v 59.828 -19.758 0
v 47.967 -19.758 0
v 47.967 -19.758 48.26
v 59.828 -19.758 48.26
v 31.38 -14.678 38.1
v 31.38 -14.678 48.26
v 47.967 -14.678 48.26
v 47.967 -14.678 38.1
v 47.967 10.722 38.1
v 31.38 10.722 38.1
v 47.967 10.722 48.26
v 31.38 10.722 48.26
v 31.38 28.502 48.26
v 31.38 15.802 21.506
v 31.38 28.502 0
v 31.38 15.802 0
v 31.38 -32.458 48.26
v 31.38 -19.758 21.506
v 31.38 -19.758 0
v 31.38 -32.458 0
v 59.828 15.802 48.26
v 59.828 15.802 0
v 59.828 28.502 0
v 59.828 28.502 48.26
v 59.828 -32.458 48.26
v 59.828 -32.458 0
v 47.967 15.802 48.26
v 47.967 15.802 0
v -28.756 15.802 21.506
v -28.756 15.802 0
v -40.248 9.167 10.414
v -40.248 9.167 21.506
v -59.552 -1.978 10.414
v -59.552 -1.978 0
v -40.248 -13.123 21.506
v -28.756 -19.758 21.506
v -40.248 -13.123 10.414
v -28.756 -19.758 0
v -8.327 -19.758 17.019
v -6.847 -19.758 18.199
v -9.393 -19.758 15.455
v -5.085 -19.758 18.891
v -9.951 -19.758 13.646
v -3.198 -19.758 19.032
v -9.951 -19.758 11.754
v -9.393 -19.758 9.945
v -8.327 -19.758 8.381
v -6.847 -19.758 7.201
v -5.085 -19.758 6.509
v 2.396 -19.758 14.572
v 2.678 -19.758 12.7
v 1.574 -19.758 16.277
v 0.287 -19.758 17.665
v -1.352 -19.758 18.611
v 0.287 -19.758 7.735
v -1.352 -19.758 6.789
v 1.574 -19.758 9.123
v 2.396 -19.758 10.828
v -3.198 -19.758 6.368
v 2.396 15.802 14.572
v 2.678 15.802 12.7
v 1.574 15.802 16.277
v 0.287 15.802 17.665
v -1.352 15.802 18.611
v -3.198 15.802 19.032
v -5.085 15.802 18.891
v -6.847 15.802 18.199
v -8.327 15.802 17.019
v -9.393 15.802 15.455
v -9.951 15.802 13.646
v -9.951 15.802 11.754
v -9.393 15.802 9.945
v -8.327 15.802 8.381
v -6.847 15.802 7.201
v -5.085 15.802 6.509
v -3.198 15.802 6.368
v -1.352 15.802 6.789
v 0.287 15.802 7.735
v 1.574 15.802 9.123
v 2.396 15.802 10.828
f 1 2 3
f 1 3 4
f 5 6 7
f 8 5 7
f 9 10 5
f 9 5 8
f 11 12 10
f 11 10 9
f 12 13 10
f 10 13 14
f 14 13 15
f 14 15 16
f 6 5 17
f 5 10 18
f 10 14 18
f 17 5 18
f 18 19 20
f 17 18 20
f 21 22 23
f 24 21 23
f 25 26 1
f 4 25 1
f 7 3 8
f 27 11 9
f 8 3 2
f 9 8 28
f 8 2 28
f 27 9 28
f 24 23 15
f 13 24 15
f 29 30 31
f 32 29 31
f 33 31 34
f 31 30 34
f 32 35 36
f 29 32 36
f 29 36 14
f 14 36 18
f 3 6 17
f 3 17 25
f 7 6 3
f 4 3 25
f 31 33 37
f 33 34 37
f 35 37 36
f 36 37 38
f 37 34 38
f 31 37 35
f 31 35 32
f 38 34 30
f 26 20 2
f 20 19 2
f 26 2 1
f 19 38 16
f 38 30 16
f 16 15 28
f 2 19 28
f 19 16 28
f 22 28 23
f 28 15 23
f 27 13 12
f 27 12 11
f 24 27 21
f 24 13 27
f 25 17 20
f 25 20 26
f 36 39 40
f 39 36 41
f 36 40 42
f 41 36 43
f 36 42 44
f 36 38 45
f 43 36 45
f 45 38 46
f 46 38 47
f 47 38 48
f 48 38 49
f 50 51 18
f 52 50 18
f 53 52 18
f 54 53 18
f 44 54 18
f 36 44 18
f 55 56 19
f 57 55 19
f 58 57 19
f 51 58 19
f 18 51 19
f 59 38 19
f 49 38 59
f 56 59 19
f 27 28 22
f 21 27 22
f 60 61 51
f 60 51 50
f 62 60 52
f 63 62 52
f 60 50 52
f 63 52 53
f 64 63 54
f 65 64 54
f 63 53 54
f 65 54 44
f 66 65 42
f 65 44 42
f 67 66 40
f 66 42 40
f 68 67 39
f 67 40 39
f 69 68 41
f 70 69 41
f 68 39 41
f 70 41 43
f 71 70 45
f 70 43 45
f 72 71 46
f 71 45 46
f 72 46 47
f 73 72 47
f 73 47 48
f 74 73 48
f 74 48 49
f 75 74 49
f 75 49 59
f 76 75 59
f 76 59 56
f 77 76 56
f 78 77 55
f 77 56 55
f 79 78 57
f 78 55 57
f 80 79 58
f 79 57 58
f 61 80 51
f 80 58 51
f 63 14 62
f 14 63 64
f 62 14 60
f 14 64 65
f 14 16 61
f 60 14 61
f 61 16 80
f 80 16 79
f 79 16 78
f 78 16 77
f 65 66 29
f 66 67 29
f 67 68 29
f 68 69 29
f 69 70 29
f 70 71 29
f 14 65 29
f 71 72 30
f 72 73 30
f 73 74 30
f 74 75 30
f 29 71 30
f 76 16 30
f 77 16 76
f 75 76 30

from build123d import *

# Parameters (mm, degrees)
F1_DEPTH  = 48.26
F2_R      = 6.35
F3_DEPTH  = 20.066
F4_W      = 90.932
F4_H      = 26.7915036529
F5_DEPTH  = 63.5
F6_W      = 12.1428427496
F6_H      = 35.56
F7_DEPTH  = 70.866
F8_W      = 35.7905875854
F8_H      = 25.4
F9_DEPTH  = 10.16
F11_START = 10.414
F10_W     = 19.304
F10_H     = 47.7508436888
F11_DEPTH = 11.176


with BuildPart() as f1:
    # F0 (on Top) → F1 (new body)
    with BuildSketch(Plane.XY):
        Polygon((59.8277186039, -32.457854175), (59.8277186039, 28.502145825), (31.3797186039, 28.502145825), (31.3797186039, 15.802145825), (-28.7564180376, 15.802145825), (-59.5522813961, -1.977854175), (-28.7564180376, -19.757854175), (31.3797186039, -19.757854175), (31.3797186039, -32.457854175), align=None)
    extrude(amount=F1_DEPTH)

    # F2 (on Front) → F3 (cut, symmetric)
    with BuildSketch(Plane.XZ):
        with Locations((-3.6722813961, 12.7)):
            Circle(F2_R)
    extrude(amount=F3_DEPTH, both=True, mode=Mode.SUBTRACT)

    # F4 (on Front) → F5 (cut, symmetric)
    with BuildSketch(Plane.XZ):
        with Locations((-14.0862813961, 34.9018583074)):
            Rectangle(F4_W, F4_H)
    extrude(amount=F5_DEPTH, both=True, mode=Mode.SUBTRACT)

    # F6 (on Top) → F7 (cut)
    with BuildSketch(Plane.XY):
        with Locations((54.0386456996, -1.977854175)):
            Rectangle(F6_W, F6_H)
    extrude(amount=F7_DEPTH, mode=Mode.SUBTRACT)

    # F8 (on face) → F9 (cut)
    with BuildSketch(Plane.XY.offset(48.26)):
        with Locations((38.911470212, -1.977854175)):
            Rectangle(F8_W, F8_H)
    extrude(amount=-F9_DEPTH, mode=Mode.SUBTRACT)

    # F10 (on Top) → F11 (cut)
    with BuildSketch(Plane.XY.offset(F11_START)):
        with Locations((-49.9002813961, -3.6451024935)):
            Rectangle(F10_W, F10_H)
    extrude(amount=F11_DEPTH, mode=Mode.SUBTRACT)


solid = f1.part
